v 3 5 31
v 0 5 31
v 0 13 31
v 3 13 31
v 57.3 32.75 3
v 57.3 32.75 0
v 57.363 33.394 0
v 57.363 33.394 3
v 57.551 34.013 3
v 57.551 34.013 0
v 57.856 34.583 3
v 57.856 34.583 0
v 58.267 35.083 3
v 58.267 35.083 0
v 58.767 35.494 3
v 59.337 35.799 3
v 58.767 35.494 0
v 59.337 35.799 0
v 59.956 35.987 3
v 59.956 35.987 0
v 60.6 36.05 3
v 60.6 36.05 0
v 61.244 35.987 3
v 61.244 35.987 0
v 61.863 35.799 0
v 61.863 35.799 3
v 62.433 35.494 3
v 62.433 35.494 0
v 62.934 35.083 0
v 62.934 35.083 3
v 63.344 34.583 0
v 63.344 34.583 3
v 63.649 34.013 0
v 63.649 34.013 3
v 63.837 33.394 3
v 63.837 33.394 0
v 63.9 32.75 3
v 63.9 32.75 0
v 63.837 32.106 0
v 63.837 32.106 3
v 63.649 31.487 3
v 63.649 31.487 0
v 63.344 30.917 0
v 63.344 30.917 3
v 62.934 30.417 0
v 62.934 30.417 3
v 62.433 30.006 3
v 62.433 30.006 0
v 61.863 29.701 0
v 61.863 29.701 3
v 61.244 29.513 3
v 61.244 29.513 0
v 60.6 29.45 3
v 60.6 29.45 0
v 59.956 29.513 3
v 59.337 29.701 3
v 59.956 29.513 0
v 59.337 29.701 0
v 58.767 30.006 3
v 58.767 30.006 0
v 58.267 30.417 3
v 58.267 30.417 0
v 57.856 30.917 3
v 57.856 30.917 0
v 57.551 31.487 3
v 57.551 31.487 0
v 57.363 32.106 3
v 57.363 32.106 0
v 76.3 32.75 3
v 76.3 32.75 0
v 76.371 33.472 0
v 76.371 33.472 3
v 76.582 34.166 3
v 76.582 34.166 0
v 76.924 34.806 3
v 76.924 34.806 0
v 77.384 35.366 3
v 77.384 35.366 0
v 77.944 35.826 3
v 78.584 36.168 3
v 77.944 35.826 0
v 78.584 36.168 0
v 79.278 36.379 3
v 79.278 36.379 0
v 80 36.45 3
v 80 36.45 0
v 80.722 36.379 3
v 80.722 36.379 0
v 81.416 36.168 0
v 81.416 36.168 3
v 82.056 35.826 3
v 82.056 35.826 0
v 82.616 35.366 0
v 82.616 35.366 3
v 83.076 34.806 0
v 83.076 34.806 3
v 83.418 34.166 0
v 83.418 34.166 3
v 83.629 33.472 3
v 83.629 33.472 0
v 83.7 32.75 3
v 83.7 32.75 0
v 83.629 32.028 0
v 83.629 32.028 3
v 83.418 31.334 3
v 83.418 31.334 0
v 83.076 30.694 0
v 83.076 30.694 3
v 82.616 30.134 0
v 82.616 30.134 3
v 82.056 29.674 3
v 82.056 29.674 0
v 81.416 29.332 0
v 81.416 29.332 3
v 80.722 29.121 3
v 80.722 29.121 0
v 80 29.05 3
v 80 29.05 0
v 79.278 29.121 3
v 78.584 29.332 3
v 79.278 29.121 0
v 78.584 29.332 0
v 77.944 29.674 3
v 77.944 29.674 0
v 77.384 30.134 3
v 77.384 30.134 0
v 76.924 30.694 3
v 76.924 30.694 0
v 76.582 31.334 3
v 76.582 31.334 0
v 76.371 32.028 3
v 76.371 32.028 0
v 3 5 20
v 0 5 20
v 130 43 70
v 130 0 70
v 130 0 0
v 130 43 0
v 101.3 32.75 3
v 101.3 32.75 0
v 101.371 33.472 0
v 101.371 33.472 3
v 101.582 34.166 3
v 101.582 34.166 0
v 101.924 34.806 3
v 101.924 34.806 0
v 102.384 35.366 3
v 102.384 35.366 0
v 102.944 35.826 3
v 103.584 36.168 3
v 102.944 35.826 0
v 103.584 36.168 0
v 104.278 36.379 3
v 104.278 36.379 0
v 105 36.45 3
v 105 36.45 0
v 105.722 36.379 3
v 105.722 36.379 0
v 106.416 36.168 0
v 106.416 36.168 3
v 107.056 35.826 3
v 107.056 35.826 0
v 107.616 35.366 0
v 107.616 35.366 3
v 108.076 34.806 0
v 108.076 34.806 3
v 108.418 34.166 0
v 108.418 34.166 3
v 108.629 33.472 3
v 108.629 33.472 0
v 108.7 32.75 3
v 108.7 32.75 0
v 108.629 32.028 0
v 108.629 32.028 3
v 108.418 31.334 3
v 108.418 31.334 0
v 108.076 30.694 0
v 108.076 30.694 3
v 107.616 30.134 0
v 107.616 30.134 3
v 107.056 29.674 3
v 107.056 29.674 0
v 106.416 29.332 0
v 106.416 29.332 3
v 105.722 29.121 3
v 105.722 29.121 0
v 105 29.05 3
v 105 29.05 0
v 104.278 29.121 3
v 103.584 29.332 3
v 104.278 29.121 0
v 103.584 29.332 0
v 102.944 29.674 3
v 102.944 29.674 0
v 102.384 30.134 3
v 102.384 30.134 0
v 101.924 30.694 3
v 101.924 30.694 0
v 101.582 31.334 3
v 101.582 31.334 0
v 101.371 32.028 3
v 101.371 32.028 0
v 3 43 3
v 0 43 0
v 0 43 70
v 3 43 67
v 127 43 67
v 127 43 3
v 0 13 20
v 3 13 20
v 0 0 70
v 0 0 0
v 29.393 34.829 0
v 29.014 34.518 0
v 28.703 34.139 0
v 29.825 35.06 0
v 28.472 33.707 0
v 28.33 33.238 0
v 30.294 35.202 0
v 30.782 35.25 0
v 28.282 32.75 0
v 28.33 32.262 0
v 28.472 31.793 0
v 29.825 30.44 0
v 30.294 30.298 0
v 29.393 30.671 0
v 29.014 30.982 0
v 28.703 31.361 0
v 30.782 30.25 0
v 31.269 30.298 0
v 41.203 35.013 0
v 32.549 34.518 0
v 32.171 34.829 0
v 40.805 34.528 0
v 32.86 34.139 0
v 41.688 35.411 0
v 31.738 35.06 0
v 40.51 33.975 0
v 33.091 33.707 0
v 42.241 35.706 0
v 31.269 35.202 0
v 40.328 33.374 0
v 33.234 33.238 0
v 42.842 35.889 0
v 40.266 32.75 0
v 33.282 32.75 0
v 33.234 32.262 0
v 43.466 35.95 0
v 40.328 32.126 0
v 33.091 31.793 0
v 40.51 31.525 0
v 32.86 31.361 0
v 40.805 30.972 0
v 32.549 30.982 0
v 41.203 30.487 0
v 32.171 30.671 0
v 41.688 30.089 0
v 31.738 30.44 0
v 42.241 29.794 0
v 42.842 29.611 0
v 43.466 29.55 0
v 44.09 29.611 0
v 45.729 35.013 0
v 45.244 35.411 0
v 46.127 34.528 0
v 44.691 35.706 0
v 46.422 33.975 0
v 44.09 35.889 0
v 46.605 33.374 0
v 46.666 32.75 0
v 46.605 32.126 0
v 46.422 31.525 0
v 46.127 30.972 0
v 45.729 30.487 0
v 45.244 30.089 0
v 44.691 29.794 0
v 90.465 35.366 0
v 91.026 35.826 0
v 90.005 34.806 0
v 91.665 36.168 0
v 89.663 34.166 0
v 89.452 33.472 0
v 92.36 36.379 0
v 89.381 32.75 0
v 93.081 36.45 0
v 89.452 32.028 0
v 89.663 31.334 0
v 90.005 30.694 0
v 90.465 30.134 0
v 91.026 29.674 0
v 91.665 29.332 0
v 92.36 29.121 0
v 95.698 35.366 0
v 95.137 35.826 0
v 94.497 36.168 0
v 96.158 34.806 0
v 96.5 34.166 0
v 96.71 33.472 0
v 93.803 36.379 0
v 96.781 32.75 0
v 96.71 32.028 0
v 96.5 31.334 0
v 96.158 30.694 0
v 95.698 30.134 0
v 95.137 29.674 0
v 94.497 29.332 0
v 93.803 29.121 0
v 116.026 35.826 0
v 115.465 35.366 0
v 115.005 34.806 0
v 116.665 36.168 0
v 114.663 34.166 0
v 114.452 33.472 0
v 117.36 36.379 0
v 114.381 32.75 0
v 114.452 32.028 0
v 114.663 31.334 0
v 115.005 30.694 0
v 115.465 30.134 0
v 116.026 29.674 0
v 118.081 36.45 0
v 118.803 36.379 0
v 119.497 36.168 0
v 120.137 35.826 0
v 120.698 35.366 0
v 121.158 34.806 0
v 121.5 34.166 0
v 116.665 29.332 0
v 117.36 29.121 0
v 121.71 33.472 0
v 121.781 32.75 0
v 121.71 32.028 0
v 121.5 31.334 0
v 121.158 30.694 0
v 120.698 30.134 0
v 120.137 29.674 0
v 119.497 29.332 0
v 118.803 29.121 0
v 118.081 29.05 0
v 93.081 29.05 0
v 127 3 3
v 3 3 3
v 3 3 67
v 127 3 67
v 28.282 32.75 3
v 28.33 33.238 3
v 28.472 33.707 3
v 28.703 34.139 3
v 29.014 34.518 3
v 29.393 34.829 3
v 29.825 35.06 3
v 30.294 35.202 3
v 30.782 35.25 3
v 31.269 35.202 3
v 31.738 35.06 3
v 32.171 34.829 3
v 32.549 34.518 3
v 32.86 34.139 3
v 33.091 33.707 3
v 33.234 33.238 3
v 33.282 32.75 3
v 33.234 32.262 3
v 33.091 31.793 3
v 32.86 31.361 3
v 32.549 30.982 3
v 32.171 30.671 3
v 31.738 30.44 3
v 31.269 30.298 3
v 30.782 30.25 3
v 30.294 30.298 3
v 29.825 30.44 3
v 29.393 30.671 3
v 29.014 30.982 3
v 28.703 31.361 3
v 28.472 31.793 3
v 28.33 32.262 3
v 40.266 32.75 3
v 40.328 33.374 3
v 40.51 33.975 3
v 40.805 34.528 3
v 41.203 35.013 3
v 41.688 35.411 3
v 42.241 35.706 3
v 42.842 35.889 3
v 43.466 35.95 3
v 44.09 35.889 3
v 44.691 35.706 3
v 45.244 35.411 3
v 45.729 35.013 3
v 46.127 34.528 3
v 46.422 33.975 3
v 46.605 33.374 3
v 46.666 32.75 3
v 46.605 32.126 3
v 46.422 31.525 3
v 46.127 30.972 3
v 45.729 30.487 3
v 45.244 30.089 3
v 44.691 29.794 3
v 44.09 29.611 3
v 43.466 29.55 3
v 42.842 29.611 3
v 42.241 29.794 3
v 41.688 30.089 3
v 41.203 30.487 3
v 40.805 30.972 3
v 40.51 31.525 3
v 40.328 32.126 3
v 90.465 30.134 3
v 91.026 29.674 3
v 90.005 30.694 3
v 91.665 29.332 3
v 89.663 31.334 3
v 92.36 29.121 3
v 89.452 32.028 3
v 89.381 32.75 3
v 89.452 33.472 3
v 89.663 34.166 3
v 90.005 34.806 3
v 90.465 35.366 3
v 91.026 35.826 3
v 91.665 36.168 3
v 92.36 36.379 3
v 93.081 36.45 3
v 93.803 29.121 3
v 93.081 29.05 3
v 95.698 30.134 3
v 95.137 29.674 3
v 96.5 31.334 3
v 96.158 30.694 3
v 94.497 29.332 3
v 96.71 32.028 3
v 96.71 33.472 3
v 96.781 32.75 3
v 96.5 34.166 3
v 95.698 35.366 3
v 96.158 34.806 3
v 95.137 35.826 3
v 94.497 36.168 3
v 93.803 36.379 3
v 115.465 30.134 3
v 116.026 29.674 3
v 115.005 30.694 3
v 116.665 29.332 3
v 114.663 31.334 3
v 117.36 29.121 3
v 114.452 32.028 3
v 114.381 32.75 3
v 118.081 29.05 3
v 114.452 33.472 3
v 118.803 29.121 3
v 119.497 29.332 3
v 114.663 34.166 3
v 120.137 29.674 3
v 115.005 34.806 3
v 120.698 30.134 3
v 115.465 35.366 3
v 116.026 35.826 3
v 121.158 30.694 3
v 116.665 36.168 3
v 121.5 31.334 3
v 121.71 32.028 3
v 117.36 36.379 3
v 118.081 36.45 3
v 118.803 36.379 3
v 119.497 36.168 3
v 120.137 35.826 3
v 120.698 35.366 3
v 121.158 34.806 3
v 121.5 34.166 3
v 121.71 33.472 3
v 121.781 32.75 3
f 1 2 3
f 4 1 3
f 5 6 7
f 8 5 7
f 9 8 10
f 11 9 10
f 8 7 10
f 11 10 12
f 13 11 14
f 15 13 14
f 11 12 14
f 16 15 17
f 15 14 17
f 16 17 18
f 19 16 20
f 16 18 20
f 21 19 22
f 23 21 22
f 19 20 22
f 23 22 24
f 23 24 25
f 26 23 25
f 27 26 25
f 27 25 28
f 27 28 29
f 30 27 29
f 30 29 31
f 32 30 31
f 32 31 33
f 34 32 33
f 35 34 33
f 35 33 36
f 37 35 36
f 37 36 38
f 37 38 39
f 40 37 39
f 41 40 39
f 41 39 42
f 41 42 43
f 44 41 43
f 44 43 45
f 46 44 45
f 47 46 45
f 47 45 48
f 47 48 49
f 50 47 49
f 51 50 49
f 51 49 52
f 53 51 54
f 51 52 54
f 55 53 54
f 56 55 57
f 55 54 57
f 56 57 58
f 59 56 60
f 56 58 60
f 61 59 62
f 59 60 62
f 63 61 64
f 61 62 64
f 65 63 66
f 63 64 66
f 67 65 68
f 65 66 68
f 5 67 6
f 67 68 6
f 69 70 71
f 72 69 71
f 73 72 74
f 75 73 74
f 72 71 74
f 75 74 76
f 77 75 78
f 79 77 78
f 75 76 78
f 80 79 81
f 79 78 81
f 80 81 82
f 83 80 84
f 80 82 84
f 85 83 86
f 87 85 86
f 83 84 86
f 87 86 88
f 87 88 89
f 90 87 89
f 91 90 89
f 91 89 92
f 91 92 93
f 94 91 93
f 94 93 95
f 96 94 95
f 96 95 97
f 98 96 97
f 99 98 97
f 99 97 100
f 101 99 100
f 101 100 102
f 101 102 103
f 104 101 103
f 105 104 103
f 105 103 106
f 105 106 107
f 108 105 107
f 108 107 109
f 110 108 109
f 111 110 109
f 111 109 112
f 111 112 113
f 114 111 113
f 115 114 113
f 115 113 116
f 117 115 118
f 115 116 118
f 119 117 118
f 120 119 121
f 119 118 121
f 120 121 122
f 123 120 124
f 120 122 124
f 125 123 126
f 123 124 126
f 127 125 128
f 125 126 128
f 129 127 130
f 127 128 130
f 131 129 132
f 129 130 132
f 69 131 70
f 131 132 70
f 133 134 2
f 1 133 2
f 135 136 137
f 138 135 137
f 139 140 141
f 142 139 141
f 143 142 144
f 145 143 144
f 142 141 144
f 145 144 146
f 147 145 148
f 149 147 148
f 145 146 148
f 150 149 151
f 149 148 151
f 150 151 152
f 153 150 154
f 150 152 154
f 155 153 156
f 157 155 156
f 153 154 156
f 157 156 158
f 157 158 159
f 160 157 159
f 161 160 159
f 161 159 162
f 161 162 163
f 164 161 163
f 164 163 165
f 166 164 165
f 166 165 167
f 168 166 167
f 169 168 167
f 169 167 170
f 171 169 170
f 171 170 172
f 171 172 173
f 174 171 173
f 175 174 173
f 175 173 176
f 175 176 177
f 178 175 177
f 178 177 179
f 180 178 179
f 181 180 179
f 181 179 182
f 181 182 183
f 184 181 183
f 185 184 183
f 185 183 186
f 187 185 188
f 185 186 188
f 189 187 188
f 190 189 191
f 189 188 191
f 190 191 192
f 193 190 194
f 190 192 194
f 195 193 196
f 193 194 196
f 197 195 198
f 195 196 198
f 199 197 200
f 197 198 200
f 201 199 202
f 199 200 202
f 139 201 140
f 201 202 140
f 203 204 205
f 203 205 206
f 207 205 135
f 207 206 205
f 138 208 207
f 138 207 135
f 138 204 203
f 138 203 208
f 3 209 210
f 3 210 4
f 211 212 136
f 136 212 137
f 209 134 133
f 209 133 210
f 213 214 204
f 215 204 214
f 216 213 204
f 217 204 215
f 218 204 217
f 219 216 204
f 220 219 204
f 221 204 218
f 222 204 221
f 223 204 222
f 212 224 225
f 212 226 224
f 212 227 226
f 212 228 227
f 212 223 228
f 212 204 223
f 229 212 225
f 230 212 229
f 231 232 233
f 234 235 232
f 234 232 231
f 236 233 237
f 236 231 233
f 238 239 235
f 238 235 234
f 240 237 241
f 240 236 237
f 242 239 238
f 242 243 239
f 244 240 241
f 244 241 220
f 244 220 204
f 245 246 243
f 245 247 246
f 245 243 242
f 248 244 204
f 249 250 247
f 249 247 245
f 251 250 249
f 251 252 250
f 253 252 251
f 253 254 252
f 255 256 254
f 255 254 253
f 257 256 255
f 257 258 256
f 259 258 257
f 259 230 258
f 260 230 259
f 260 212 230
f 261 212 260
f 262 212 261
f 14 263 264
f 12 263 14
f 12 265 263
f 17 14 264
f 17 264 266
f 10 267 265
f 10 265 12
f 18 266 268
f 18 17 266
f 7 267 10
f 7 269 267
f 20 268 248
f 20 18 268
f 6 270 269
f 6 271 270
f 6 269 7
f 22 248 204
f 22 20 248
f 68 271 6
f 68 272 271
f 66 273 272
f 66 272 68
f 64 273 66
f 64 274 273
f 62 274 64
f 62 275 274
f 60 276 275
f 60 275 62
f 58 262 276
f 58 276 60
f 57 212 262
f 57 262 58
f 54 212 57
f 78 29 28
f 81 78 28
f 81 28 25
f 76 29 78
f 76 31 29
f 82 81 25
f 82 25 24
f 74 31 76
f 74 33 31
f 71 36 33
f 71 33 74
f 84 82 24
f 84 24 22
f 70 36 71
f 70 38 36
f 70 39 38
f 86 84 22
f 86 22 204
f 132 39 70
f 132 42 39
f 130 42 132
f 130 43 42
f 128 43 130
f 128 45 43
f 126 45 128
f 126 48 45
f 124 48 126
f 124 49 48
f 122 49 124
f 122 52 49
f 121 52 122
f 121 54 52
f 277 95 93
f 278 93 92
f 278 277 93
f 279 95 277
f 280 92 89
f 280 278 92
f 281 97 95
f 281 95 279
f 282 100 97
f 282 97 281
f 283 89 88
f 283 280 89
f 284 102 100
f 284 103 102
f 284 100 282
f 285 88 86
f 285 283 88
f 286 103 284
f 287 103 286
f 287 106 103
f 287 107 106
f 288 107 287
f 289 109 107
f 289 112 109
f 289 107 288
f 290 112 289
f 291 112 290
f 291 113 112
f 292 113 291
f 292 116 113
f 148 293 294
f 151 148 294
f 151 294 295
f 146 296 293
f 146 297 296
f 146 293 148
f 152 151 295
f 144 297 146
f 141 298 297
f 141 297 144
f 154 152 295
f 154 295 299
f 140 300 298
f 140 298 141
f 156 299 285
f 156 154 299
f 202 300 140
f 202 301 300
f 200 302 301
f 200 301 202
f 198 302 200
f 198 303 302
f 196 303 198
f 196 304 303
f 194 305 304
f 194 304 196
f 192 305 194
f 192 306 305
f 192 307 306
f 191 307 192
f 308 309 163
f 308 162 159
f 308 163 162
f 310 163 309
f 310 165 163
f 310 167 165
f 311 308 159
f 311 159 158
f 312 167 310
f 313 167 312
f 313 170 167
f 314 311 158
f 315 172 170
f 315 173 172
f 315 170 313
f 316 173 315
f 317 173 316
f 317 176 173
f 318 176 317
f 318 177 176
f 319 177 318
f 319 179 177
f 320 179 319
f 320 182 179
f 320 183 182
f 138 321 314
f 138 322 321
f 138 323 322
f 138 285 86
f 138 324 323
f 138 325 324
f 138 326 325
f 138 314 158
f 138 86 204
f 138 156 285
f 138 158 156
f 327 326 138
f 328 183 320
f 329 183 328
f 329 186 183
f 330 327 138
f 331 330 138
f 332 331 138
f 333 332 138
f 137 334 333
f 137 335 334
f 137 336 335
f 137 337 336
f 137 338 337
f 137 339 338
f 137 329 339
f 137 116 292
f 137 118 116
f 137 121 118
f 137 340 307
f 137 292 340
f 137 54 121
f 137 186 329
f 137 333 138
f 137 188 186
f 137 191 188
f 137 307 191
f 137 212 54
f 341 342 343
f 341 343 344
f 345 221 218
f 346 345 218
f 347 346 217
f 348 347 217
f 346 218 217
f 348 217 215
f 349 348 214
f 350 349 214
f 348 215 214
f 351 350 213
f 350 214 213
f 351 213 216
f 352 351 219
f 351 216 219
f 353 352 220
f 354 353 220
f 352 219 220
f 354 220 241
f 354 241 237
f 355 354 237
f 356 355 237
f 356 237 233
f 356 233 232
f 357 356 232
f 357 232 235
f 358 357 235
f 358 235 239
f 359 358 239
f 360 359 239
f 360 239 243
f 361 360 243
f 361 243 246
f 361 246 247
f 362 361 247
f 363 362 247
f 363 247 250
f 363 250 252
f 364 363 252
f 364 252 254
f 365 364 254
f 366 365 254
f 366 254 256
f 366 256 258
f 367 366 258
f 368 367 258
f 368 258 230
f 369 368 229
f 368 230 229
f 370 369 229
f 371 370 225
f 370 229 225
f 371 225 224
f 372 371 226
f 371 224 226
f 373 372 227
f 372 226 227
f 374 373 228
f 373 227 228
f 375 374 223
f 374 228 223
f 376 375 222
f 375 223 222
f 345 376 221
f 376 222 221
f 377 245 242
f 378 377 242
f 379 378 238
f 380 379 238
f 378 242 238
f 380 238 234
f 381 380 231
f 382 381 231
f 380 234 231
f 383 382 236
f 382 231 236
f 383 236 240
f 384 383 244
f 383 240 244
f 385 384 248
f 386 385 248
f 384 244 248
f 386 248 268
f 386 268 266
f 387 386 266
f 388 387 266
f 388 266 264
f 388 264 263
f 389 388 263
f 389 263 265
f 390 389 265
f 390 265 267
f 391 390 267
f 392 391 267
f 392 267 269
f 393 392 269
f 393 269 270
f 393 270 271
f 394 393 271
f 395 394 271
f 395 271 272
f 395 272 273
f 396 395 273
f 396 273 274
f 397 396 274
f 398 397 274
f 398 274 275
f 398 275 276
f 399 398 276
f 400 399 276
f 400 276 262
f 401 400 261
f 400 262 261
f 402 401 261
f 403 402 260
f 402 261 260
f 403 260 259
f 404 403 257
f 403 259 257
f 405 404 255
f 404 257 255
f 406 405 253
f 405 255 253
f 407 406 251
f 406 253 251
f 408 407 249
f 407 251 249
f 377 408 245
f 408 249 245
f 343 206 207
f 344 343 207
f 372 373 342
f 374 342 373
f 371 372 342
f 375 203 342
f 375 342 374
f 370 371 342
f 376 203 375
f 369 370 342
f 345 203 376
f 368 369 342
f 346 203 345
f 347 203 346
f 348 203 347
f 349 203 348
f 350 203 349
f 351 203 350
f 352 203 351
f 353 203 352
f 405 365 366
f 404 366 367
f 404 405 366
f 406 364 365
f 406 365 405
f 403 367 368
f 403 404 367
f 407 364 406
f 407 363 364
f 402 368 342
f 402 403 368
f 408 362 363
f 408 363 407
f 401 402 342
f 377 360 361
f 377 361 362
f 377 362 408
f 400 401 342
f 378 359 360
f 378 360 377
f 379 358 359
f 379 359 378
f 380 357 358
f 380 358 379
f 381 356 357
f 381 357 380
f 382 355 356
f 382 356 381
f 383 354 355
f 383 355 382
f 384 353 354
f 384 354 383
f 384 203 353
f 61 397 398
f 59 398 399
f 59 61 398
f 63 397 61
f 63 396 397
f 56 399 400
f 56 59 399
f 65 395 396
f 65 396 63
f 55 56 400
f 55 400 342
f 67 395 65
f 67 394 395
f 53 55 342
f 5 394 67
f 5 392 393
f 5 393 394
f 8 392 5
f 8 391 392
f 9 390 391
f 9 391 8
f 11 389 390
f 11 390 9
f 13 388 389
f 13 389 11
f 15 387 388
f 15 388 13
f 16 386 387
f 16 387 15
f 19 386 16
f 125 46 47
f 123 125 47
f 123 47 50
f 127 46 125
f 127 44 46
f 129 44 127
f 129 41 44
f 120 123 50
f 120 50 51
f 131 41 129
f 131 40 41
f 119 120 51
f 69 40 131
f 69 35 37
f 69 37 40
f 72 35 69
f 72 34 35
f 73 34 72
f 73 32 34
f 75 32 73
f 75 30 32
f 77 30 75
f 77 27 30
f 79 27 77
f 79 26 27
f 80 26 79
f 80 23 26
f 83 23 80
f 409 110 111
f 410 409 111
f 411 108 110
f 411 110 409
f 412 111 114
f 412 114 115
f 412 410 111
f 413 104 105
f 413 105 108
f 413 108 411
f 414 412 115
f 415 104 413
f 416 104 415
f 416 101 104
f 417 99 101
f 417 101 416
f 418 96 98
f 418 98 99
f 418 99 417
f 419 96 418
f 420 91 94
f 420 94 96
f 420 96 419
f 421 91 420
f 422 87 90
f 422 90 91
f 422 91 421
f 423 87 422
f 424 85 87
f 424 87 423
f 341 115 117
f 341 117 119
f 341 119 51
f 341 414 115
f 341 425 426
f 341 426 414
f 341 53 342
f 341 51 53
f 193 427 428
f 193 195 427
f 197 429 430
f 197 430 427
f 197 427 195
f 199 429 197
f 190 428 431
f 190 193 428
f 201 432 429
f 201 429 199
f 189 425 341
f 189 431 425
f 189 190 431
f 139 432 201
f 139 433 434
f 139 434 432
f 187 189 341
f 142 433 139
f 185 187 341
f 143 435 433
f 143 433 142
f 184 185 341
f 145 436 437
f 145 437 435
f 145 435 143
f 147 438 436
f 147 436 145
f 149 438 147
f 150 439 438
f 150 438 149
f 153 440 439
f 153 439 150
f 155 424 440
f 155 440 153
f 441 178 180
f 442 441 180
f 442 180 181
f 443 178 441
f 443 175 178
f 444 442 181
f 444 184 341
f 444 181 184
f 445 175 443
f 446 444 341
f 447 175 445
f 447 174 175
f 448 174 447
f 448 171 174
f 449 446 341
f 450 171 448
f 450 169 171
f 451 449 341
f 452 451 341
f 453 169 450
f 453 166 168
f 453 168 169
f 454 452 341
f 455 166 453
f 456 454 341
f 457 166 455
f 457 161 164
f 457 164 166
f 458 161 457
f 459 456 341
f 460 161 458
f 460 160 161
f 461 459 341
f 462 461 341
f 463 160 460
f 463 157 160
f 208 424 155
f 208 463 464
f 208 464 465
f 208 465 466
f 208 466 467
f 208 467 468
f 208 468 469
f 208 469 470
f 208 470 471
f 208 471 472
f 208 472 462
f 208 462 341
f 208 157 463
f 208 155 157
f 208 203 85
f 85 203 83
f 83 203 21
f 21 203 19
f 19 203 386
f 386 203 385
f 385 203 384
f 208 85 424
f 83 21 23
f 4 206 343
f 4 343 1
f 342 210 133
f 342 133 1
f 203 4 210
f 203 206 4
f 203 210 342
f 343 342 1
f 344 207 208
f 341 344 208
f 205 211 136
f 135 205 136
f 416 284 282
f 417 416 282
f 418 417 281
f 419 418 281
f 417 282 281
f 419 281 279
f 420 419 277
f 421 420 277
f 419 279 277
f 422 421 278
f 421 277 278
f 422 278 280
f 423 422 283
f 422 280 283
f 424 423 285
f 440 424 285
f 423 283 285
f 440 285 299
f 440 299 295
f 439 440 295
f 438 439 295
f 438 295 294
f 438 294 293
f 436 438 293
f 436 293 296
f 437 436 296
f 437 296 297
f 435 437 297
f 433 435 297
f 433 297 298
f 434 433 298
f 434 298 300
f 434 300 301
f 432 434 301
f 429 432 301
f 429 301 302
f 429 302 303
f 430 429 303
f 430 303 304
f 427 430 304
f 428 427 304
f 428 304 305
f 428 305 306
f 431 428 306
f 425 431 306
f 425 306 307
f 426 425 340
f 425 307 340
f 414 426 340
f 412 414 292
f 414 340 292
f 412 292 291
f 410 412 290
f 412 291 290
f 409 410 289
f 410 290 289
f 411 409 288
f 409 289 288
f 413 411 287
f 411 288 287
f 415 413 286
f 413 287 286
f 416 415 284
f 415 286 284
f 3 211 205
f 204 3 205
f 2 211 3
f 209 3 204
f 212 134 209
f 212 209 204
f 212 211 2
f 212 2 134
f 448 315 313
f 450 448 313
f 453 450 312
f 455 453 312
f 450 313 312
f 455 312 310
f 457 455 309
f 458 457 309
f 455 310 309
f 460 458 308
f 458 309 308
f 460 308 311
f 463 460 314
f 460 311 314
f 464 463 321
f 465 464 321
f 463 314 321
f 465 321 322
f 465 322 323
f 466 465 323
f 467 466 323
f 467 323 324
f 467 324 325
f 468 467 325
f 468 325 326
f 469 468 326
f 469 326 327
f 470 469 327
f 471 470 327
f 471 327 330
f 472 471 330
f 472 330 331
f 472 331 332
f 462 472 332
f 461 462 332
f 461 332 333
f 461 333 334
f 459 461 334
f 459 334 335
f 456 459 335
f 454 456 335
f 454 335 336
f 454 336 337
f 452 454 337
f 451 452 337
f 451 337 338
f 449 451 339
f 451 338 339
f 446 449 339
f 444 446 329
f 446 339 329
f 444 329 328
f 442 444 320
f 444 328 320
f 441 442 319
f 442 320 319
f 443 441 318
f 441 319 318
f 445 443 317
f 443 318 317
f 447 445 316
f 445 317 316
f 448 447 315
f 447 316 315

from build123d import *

# Parameters (mm, degrees)
SKETCH5_W           = 130
SKETCH5_H           = 70
BOSS_EXTRUDE3_DEPTH = 43
SKETCH6_W           = 124
SKETCH6_H           = 64
CUT_EXTRUDE3_DEPTH  = 40
SKETCH8_R           = 3.7
CUT_EXTRUDE7_DEPTH  = 40
SKETCH9_R           = 3.3
SKETCH9_R_2         = 3.2
SKETCH9_R_3         = 2.5
CUT_EXTRUDE8_DEPTH  = 40
SKETCH10_W          = 11
SKETCH10_H          = 8
CUT_EXTRUDE9_DEPTH  = 40


with BuildPart() as part:
    # Sketch5 → Boss-Extrude3 (new body)
    with BuildSketch(Plane(origin=(0, 0, 0), x_dir=(1, 0, 0), z_dir=(0, 1, 0))):
        with Locations((65, -35)):
            Rectangle(SKETCH5_W, SKETCH5_H)
    extrude(amount=BOSS_EXTRUDE3_DEPTH)

    # Sketch6 → Cut-Extrude3 (cut)
    with BuildSketch(Plane(origin=(0, 43, 0), x_dir=(1, 0, 0), z_dir=(0, 1, 0))):
        with Locations((65, -35)):
            Rectangle(SKETCH6_W, SKETCH6_H)
    extrude(amount=-CUT_EXTRUDE3_DEPTH, mode=Mode.SUBTRACT)

    # Sketch8 → Cut-Extrude7 (cut)
    with BuildSketch(Plane(origin=(0, 0, 0), x_dir=(-1, 0, 0), z_dir=(0, 0, -1))):
        with Locations((-105, 32.75)):
            Circle(SKETCH8_R)
        with Locations((-93.081395349, 32.75)):
            Circle(SKETCH8_R)
        with Locations((-80, 32.75)):
            Circle(SKETCH8_R)
        with Locations((-118.081395349, 32.75)):
            Circle(SKETCH8_R)
    extrude(amount=-CUT_EXTRUDE7_DEPTH, mode=Mode.SUBTRACT)

    # Sketch9 → Cut-Extrude8 (cut)
    with BuildSketch(Plane(origin=(0, 0, 0), x_dir=(-1, 0, 0), z_dir=(0, 0, -1))):
        with Locations((-60.600049653, 32.75)):
            Circle(SKETCH9_R)
        with Locations((-43.4660788, 32.75)):
            Circle(SKETCH9_R_2)
        with Locations((-30.78166501, 32.75)):
            Circle(SKETCH9_R_3)
    extrude(amount=-CUT_EXTRUDE8_DEPTH, mode=Mode.SUBTRACT)

    # Sketch10 → Cut-Extrude9 (cut)
    with BuildSketch(Plane.ZY):
        with Locations((25.5, 9)):
            Rectangle(SKETCH10_W, SKETCH10_H)
    extrude(amount=-CUT_EXTRUDE9_DEPTH, mode=Mode.SUBTRACT)


solid = part.part
